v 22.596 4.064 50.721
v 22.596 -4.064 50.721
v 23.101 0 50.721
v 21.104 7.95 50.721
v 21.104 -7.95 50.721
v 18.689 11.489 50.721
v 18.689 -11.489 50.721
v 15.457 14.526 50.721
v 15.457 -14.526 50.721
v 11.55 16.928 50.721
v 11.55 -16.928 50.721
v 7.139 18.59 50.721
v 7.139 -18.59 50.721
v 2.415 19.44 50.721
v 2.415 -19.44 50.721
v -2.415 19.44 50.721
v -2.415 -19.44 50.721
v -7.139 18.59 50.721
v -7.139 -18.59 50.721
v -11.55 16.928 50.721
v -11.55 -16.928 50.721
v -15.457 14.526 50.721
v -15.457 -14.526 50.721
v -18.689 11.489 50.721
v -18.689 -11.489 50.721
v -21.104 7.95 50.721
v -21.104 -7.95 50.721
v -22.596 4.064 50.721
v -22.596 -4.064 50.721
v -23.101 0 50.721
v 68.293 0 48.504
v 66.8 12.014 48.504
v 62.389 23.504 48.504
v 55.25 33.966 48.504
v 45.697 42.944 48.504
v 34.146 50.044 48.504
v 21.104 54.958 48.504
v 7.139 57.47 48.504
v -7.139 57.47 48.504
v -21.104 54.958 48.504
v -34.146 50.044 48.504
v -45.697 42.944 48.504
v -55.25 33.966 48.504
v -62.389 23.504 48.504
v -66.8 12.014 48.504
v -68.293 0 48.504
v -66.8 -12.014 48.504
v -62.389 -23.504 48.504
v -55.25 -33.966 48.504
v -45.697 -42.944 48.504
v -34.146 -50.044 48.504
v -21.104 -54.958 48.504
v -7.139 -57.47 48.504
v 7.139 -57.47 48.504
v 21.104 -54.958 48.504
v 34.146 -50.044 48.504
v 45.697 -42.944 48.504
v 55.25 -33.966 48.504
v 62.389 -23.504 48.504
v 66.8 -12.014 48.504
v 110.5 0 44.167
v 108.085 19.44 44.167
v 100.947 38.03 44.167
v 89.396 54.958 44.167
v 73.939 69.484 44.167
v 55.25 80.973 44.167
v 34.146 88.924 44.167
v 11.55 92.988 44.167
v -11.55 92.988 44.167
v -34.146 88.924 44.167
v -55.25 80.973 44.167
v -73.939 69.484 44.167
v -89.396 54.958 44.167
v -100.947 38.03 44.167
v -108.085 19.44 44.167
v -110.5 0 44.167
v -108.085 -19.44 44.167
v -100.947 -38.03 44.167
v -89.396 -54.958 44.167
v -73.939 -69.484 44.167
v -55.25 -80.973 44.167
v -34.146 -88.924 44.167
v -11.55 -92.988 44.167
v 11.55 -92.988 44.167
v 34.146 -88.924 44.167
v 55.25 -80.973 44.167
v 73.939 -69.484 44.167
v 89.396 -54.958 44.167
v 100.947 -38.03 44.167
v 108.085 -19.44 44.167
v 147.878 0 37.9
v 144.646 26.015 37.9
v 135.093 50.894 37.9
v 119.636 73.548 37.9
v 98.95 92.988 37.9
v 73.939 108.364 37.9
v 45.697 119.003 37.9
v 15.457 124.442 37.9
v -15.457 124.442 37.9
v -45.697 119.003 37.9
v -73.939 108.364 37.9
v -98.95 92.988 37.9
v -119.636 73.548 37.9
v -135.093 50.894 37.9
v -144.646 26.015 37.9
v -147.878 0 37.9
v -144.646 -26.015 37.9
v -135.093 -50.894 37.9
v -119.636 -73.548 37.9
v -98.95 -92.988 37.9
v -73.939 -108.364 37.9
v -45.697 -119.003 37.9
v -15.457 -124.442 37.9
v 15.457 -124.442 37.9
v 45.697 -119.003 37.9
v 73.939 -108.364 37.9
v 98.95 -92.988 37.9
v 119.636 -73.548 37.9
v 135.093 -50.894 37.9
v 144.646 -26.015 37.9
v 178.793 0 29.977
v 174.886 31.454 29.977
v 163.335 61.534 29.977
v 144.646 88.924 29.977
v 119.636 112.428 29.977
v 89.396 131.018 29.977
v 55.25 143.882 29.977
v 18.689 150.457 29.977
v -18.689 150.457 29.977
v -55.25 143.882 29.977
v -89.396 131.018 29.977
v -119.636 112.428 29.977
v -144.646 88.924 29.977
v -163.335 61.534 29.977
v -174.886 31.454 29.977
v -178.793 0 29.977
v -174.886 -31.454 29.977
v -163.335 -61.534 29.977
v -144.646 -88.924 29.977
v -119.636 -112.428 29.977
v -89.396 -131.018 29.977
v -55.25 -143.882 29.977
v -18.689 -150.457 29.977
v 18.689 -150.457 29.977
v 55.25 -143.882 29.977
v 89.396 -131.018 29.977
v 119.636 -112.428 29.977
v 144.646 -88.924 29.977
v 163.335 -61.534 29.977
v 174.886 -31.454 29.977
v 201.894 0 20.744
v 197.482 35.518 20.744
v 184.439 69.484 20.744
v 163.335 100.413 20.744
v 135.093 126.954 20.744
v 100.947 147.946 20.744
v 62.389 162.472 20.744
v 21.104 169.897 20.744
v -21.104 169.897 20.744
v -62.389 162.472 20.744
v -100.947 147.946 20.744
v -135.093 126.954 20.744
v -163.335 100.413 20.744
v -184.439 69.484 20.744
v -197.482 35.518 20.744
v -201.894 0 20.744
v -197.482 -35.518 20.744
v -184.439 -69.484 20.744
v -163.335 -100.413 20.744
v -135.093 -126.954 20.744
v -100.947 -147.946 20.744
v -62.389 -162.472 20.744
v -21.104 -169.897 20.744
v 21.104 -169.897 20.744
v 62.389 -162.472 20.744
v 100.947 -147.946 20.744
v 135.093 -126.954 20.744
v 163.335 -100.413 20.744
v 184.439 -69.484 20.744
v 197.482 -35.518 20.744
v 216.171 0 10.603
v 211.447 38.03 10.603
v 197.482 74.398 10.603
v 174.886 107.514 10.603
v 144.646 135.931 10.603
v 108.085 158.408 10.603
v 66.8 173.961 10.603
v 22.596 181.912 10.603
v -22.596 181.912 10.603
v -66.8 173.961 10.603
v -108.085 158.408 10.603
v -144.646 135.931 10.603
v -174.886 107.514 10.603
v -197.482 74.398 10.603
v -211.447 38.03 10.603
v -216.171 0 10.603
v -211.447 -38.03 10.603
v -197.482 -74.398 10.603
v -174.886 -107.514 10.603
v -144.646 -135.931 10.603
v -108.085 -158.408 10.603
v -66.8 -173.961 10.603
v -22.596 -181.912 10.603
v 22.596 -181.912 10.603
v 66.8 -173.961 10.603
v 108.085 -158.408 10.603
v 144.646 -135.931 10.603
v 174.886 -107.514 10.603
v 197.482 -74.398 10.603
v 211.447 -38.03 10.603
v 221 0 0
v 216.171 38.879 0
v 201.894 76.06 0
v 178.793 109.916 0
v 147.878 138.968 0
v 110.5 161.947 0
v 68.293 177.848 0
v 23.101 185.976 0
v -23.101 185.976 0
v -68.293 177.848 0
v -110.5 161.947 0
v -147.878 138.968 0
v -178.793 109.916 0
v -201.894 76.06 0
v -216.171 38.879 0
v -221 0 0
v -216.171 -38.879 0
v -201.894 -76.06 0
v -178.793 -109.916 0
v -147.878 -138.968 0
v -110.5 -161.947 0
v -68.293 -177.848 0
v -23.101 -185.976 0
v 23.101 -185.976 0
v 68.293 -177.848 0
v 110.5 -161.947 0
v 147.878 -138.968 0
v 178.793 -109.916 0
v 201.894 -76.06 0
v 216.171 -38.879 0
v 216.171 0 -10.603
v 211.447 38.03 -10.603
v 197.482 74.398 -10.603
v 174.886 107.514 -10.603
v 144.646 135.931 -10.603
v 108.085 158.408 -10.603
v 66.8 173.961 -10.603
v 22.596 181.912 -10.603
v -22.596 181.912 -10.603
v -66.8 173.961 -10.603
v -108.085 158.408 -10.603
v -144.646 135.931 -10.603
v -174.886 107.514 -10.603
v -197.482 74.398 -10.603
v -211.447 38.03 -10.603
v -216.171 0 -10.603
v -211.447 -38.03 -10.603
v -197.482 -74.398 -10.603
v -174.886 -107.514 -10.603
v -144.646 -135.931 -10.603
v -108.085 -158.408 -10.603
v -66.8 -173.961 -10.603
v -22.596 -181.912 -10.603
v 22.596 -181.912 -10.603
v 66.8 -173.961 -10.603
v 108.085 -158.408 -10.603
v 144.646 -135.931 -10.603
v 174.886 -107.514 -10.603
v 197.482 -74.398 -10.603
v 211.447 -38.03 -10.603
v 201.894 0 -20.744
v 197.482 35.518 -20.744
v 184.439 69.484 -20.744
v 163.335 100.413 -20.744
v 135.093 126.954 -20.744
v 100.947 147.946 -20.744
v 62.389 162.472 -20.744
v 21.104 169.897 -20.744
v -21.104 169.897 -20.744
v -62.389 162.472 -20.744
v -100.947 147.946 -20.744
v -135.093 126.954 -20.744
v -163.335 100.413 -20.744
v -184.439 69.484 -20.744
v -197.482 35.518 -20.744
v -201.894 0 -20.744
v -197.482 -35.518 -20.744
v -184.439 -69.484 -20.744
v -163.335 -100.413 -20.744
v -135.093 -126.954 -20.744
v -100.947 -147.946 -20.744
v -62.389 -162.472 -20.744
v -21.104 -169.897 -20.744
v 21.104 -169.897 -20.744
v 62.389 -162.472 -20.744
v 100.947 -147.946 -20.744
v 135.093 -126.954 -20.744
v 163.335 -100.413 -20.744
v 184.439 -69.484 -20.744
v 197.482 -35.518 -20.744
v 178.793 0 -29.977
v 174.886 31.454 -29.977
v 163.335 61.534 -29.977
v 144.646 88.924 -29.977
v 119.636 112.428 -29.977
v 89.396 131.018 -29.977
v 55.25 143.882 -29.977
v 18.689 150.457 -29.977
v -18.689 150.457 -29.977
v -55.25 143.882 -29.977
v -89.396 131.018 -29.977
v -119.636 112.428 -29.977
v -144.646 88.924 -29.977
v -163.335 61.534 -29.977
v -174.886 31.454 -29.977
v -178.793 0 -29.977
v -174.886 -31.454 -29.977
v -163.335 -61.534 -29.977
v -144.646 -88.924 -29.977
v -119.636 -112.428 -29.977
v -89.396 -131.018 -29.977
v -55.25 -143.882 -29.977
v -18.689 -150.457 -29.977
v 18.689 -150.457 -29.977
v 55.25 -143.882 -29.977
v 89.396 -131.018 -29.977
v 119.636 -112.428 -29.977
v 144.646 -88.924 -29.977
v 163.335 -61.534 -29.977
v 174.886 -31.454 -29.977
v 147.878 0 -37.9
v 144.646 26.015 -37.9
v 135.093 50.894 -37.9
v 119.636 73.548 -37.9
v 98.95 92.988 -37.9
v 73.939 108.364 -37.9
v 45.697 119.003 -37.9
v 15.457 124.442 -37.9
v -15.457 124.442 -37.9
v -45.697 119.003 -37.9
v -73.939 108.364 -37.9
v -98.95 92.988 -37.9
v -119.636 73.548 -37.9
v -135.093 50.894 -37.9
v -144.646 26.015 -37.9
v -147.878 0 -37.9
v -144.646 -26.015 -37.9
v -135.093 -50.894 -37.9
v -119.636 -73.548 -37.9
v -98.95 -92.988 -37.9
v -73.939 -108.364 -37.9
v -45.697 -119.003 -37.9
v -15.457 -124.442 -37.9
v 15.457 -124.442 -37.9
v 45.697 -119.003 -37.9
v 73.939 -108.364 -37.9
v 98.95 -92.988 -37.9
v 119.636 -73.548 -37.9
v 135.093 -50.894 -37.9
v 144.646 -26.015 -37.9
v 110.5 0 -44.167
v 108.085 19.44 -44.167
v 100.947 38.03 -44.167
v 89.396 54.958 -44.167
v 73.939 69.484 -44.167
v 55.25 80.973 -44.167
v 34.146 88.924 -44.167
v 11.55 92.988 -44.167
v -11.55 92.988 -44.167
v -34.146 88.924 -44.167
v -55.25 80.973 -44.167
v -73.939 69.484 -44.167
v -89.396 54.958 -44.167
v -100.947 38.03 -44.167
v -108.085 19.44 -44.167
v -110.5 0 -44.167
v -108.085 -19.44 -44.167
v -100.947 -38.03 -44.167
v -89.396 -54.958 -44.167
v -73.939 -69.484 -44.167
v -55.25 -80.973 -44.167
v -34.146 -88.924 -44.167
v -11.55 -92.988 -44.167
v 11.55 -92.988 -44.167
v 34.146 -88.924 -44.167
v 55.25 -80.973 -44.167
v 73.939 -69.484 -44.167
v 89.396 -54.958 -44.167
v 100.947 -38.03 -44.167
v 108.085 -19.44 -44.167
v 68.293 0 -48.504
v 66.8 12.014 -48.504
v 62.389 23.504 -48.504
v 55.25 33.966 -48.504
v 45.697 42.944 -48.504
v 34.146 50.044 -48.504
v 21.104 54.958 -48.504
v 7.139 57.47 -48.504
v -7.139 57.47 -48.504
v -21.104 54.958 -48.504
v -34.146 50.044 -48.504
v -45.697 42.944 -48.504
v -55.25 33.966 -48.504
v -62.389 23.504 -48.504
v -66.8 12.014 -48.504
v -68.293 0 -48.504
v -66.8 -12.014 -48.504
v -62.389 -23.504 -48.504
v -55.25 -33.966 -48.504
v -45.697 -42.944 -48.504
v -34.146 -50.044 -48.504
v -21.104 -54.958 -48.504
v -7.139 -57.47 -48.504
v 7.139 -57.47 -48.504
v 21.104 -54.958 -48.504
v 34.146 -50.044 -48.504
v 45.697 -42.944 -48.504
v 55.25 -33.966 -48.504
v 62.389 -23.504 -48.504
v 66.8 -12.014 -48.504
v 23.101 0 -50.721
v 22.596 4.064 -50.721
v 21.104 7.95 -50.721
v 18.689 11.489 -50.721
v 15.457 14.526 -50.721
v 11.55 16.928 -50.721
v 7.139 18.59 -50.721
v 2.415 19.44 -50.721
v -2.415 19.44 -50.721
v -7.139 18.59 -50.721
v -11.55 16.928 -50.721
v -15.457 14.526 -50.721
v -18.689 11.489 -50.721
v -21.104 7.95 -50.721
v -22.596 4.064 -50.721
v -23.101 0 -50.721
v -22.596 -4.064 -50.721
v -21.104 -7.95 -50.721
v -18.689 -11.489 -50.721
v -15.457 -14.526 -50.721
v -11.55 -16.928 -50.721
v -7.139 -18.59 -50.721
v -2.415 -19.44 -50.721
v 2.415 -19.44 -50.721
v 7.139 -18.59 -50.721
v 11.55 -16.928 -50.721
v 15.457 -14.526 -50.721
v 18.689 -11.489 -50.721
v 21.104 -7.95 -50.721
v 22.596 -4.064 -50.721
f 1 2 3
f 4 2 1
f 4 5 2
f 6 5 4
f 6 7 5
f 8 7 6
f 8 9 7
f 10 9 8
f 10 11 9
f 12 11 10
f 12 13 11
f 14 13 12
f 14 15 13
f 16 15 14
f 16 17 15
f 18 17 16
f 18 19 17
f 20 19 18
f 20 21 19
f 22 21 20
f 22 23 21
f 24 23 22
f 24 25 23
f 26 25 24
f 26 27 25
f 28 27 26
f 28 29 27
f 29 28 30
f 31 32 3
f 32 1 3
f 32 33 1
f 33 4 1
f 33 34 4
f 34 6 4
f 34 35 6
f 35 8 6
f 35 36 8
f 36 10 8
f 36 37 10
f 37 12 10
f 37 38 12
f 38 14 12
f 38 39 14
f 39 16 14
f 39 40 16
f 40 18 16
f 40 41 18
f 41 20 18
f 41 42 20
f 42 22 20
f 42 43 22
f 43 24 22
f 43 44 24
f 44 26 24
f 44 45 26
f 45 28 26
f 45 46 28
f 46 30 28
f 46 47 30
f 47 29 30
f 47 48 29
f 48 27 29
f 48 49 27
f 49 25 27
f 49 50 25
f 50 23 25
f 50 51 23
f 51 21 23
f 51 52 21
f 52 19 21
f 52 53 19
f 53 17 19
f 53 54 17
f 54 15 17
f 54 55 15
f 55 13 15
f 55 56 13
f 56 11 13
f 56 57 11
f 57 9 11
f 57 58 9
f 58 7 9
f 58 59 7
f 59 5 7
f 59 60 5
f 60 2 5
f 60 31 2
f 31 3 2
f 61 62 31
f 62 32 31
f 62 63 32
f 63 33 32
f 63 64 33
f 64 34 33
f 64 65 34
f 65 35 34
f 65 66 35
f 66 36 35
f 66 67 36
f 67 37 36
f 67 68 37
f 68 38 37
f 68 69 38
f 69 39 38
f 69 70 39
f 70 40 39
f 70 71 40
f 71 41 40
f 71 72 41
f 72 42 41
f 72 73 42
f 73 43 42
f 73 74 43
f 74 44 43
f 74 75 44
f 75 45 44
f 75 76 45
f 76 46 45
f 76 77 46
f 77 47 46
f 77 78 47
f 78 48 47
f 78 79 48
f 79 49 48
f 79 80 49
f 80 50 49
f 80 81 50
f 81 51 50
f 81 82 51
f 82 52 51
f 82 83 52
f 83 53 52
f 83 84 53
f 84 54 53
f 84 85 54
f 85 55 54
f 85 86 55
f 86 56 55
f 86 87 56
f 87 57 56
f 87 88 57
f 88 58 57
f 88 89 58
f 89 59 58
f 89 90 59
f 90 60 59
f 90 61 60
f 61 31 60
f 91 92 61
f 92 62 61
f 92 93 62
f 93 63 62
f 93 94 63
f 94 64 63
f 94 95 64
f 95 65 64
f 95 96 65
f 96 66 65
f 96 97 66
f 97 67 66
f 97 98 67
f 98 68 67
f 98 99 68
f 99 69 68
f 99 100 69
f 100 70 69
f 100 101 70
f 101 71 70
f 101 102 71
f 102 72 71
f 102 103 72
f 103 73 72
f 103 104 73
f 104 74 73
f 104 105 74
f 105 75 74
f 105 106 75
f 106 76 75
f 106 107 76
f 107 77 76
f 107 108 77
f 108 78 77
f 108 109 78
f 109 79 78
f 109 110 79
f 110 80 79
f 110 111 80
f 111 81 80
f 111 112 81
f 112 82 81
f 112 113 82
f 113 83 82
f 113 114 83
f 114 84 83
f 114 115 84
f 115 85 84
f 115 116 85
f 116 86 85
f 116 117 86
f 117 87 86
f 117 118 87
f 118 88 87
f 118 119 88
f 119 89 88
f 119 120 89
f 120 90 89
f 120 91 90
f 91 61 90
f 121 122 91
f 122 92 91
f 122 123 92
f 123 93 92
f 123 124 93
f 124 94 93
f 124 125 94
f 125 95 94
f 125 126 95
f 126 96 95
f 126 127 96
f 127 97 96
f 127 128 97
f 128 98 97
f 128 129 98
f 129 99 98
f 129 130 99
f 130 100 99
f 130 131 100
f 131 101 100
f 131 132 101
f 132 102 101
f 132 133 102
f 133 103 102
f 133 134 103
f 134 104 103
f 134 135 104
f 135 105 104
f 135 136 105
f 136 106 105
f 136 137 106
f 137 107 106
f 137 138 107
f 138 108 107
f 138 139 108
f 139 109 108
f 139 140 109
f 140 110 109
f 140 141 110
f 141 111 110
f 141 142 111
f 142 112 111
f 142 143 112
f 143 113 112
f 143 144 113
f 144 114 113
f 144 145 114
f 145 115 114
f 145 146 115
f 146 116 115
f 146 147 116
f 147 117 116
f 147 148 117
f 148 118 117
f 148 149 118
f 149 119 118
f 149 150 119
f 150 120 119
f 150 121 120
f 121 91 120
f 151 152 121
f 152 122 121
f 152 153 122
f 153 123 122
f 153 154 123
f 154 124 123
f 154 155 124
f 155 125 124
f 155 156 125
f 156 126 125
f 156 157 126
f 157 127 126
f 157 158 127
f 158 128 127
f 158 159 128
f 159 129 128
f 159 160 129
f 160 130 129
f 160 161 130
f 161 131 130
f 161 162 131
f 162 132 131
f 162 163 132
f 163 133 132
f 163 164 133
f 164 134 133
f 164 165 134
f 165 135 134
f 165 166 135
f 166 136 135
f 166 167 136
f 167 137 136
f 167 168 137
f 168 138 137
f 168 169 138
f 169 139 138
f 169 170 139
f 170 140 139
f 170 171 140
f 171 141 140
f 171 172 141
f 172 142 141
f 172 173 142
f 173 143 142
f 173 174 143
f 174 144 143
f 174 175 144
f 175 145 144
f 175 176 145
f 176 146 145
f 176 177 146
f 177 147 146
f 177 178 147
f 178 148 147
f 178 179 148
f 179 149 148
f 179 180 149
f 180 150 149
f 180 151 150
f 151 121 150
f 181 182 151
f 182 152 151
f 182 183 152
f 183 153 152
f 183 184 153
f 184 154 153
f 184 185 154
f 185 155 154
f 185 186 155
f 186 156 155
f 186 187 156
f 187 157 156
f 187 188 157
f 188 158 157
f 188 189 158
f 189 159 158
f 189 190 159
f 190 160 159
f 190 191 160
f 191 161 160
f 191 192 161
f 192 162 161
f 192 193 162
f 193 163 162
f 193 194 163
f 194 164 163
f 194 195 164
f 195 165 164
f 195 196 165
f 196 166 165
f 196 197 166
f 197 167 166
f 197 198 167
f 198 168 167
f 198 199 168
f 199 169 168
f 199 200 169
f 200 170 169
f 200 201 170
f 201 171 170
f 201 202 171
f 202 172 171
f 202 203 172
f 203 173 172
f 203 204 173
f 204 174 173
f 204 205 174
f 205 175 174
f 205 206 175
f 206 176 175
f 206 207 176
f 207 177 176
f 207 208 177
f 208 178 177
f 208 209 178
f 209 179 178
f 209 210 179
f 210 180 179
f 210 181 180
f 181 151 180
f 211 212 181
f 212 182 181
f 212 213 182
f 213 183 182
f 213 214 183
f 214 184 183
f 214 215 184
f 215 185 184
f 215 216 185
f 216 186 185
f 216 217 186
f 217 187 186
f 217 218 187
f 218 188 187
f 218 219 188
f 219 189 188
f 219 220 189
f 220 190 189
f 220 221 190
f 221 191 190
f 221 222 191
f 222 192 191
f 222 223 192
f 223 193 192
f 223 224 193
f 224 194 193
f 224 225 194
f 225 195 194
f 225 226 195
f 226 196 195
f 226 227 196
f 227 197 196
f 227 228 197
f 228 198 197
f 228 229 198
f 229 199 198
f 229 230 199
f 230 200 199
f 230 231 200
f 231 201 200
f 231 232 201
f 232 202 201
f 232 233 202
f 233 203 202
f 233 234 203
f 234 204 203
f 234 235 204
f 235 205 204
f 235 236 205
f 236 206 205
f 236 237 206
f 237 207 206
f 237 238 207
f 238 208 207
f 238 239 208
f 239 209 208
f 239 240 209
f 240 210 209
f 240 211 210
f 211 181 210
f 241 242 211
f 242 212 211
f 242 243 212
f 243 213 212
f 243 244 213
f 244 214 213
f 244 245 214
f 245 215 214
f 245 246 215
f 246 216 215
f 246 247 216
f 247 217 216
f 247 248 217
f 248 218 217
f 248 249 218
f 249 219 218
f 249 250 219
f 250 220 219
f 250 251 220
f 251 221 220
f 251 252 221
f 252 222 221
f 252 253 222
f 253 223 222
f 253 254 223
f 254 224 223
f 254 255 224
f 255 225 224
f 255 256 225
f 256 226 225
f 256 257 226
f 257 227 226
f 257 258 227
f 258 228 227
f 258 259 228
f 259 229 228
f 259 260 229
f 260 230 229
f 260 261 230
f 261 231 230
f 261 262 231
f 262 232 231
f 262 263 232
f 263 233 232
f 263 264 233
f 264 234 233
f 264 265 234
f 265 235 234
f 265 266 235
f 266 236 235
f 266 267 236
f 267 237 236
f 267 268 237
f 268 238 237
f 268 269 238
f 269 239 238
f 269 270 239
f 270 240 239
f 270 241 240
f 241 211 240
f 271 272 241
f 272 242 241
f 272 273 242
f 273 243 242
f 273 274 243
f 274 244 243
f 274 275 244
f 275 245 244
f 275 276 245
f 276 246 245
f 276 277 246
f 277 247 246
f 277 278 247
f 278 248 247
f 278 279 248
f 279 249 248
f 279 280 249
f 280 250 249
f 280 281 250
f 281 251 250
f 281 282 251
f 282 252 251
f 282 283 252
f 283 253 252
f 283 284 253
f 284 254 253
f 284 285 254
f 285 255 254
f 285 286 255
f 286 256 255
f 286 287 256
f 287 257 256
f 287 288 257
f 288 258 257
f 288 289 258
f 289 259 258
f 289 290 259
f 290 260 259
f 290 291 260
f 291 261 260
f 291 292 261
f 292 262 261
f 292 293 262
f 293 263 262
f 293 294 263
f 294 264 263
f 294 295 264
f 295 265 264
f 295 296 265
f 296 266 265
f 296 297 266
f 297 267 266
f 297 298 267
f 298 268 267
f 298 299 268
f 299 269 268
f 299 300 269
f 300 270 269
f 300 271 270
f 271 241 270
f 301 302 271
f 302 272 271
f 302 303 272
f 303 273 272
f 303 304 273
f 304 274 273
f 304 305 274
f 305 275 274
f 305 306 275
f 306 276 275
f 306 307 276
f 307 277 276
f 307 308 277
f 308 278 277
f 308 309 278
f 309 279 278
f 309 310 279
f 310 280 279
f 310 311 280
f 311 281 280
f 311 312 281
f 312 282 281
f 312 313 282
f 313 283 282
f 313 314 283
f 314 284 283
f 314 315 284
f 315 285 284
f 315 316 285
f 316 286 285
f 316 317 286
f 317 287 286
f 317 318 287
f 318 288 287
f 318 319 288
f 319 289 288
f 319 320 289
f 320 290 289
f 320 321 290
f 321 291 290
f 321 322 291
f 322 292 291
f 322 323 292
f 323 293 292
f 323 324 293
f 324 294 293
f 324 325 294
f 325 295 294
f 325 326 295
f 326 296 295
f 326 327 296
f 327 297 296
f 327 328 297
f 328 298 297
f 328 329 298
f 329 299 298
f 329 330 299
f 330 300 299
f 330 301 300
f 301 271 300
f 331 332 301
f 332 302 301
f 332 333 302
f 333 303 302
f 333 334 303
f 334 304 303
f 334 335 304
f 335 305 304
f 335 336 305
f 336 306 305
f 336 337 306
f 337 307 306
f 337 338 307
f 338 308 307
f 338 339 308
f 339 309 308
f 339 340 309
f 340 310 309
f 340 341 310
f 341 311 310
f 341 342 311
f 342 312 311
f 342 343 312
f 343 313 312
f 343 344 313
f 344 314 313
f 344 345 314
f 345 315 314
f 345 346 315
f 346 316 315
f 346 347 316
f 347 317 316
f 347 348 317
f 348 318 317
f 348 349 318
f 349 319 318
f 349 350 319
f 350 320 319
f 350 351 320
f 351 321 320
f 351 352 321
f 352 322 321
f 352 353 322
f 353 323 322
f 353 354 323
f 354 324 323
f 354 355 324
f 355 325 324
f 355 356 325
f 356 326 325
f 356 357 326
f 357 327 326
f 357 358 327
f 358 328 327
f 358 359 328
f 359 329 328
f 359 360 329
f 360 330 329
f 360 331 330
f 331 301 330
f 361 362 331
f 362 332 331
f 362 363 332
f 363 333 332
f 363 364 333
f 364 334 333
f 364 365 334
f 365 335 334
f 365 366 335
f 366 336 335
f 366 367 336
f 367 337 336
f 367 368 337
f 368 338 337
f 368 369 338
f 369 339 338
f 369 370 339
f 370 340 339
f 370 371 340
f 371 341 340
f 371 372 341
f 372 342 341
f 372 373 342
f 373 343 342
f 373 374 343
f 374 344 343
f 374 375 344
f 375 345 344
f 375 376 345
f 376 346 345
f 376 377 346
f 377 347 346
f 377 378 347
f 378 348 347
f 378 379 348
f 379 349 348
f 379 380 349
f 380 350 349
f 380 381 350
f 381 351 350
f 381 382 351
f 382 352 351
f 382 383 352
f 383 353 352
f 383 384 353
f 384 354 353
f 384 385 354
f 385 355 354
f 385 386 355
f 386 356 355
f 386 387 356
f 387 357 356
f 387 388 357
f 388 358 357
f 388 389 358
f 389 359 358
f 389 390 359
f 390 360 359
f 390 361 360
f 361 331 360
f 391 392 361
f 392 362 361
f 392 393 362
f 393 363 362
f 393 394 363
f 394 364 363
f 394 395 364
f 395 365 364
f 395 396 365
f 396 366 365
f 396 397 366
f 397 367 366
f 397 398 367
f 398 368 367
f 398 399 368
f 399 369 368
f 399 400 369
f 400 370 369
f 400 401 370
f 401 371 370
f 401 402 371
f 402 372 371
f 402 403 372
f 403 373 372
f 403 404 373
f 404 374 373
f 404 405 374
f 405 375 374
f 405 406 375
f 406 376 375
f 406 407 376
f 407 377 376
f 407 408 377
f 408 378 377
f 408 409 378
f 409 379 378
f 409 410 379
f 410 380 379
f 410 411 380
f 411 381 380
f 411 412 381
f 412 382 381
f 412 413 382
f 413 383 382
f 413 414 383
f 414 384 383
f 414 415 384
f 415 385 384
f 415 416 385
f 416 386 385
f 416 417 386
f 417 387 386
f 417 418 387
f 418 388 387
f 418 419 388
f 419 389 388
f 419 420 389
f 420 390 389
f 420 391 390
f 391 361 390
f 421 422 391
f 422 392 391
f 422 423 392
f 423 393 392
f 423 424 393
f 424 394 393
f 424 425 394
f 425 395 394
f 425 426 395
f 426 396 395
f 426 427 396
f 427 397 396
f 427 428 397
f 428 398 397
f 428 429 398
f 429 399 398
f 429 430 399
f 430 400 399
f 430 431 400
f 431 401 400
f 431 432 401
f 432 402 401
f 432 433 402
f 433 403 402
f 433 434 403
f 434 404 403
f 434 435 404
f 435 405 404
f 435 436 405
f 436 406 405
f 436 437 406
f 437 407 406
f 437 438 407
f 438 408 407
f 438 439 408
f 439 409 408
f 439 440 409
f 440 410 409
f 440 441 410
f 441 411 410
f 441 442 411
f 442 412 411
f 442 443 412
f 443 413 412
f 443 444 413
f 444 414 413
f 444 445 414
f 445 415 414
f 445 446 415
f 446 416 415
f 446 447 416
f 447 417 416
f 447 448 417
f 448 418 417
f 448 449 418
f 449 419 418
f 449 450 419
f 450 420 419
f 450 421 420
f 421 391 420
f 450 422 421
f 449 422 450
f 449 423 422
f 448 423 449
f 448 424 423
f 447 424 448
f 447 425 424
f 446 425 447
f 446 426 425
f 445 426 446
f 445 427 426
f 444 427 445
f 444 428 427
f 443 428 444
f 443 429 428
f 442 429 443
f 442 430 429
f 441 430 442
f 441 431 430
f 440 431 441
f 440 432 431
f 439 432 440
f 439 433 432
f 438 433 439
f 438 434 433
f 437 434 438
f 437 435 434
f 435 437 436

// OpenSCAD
// Generated by SolidPython 1.0.1 on 2020-07-29 00:46:50


scale(v = [13, 11, 3]) {
	sphere(r = 17);
}
/***********************************************
*********      SolidPython code:      **********
************************************************
 
# import packages: SolidPython
from solid import *
from solid.utils import *
from itertools import chain, combinations, permutations


class Resize:

    def __init__(self, scad_file):
        self.scad_file = scad_file
        #self.scad_file = import_scad(scad_file)
        # cone/cylinder param:
        self.r1 = 0
        self.r2 = 0
        self.h = 0
        # rectangular prism param:
        self.w = 0
        self.l = 0
        # ellipse param:
        self.r = 0

    # import OpenScad code (file name corresponds to shape)


    # classify shape + parameters
    def assign(self, param1, param2, param3):
        if self.scad_file == 'cone.scad':
            self.r1 = param1
            self.r2 = param2
            self.h = param3
        elif self.scad_file == 'cylinder.scad':
            self.r1 = param1
            self.r2 = param2
            self.h = param3
        elif self.scad_file == 'rectangularPrism.scad':
            self.h = param1
            self.l = param2
            self.w = param3
        else:
            self.r = param1
            self.h = param2

    # resize parameters
    def iterate(self):
        x = range(3, 20, 2)
        i = 1
        if self.scad_file == 'cone.scad':
            tempList = list(permutations(x, 2))
            for temp in tempList:
                param1 = temp[0]
                param2 = temp[1]
                filepath = 'produced_scad_files/' + 'cone' + str(param1) + '_' + str(param2) + '_' + '.scad'
                scad_render_to_file(cylinder(h=param1, r1=param2, r2=0), filepath)

        elif self.scad_file == 'cylinder.scad':
            tempList = list(permutations(x, 3))
            for temp in tempList:
                param1 = temp[0]
                param2 = temp[1]
                filepath = 'produced_scad_files/' + 'cylinder' + str(param1) + '_' + str(param2) + '_' + '.scad'
                scad_render_to_file(cylinder(h=param1, r1=param2, r2=param2), filepath)

        elif self.scad_file == 'rectangularPrism.scad':
            tempList = list(permutations(x, 3))
            for temp in tempList:
                param1 = temp[0]
                param2 = temp[1]
                param3 = temp[2]
                filepath = 'produced_scad_files/' + 'rectangularPrism' + str(param1) + '_' + str(param2) + '_' + str(
                    param3) + '.scad'
                scad_render_to_file(cube(size=(param1, param2, param3)), filepath)

        elif self.scad_file == 'ellipse.scad':
            tempList = list(permutations(x, 4))
            for temp in tempList:
                param1 = temp[0]
                param2 = temp[1]
                param3 = temp[2]
                param4 = temp[3]
                filepath = 'produced_scad_files/' + 'ellipse' + str(param1) + '_' + str(param2) + '_' + str(param3) + '_' + str(param4) + '.scad'
                scad_render_to_file(scale([param1, param2, param3])(sphere(r=param4)), filepath)

    def render_to_scadfile(self):
        scad_render_to_file(scad, 'example.scad') 
 
************************************************/
